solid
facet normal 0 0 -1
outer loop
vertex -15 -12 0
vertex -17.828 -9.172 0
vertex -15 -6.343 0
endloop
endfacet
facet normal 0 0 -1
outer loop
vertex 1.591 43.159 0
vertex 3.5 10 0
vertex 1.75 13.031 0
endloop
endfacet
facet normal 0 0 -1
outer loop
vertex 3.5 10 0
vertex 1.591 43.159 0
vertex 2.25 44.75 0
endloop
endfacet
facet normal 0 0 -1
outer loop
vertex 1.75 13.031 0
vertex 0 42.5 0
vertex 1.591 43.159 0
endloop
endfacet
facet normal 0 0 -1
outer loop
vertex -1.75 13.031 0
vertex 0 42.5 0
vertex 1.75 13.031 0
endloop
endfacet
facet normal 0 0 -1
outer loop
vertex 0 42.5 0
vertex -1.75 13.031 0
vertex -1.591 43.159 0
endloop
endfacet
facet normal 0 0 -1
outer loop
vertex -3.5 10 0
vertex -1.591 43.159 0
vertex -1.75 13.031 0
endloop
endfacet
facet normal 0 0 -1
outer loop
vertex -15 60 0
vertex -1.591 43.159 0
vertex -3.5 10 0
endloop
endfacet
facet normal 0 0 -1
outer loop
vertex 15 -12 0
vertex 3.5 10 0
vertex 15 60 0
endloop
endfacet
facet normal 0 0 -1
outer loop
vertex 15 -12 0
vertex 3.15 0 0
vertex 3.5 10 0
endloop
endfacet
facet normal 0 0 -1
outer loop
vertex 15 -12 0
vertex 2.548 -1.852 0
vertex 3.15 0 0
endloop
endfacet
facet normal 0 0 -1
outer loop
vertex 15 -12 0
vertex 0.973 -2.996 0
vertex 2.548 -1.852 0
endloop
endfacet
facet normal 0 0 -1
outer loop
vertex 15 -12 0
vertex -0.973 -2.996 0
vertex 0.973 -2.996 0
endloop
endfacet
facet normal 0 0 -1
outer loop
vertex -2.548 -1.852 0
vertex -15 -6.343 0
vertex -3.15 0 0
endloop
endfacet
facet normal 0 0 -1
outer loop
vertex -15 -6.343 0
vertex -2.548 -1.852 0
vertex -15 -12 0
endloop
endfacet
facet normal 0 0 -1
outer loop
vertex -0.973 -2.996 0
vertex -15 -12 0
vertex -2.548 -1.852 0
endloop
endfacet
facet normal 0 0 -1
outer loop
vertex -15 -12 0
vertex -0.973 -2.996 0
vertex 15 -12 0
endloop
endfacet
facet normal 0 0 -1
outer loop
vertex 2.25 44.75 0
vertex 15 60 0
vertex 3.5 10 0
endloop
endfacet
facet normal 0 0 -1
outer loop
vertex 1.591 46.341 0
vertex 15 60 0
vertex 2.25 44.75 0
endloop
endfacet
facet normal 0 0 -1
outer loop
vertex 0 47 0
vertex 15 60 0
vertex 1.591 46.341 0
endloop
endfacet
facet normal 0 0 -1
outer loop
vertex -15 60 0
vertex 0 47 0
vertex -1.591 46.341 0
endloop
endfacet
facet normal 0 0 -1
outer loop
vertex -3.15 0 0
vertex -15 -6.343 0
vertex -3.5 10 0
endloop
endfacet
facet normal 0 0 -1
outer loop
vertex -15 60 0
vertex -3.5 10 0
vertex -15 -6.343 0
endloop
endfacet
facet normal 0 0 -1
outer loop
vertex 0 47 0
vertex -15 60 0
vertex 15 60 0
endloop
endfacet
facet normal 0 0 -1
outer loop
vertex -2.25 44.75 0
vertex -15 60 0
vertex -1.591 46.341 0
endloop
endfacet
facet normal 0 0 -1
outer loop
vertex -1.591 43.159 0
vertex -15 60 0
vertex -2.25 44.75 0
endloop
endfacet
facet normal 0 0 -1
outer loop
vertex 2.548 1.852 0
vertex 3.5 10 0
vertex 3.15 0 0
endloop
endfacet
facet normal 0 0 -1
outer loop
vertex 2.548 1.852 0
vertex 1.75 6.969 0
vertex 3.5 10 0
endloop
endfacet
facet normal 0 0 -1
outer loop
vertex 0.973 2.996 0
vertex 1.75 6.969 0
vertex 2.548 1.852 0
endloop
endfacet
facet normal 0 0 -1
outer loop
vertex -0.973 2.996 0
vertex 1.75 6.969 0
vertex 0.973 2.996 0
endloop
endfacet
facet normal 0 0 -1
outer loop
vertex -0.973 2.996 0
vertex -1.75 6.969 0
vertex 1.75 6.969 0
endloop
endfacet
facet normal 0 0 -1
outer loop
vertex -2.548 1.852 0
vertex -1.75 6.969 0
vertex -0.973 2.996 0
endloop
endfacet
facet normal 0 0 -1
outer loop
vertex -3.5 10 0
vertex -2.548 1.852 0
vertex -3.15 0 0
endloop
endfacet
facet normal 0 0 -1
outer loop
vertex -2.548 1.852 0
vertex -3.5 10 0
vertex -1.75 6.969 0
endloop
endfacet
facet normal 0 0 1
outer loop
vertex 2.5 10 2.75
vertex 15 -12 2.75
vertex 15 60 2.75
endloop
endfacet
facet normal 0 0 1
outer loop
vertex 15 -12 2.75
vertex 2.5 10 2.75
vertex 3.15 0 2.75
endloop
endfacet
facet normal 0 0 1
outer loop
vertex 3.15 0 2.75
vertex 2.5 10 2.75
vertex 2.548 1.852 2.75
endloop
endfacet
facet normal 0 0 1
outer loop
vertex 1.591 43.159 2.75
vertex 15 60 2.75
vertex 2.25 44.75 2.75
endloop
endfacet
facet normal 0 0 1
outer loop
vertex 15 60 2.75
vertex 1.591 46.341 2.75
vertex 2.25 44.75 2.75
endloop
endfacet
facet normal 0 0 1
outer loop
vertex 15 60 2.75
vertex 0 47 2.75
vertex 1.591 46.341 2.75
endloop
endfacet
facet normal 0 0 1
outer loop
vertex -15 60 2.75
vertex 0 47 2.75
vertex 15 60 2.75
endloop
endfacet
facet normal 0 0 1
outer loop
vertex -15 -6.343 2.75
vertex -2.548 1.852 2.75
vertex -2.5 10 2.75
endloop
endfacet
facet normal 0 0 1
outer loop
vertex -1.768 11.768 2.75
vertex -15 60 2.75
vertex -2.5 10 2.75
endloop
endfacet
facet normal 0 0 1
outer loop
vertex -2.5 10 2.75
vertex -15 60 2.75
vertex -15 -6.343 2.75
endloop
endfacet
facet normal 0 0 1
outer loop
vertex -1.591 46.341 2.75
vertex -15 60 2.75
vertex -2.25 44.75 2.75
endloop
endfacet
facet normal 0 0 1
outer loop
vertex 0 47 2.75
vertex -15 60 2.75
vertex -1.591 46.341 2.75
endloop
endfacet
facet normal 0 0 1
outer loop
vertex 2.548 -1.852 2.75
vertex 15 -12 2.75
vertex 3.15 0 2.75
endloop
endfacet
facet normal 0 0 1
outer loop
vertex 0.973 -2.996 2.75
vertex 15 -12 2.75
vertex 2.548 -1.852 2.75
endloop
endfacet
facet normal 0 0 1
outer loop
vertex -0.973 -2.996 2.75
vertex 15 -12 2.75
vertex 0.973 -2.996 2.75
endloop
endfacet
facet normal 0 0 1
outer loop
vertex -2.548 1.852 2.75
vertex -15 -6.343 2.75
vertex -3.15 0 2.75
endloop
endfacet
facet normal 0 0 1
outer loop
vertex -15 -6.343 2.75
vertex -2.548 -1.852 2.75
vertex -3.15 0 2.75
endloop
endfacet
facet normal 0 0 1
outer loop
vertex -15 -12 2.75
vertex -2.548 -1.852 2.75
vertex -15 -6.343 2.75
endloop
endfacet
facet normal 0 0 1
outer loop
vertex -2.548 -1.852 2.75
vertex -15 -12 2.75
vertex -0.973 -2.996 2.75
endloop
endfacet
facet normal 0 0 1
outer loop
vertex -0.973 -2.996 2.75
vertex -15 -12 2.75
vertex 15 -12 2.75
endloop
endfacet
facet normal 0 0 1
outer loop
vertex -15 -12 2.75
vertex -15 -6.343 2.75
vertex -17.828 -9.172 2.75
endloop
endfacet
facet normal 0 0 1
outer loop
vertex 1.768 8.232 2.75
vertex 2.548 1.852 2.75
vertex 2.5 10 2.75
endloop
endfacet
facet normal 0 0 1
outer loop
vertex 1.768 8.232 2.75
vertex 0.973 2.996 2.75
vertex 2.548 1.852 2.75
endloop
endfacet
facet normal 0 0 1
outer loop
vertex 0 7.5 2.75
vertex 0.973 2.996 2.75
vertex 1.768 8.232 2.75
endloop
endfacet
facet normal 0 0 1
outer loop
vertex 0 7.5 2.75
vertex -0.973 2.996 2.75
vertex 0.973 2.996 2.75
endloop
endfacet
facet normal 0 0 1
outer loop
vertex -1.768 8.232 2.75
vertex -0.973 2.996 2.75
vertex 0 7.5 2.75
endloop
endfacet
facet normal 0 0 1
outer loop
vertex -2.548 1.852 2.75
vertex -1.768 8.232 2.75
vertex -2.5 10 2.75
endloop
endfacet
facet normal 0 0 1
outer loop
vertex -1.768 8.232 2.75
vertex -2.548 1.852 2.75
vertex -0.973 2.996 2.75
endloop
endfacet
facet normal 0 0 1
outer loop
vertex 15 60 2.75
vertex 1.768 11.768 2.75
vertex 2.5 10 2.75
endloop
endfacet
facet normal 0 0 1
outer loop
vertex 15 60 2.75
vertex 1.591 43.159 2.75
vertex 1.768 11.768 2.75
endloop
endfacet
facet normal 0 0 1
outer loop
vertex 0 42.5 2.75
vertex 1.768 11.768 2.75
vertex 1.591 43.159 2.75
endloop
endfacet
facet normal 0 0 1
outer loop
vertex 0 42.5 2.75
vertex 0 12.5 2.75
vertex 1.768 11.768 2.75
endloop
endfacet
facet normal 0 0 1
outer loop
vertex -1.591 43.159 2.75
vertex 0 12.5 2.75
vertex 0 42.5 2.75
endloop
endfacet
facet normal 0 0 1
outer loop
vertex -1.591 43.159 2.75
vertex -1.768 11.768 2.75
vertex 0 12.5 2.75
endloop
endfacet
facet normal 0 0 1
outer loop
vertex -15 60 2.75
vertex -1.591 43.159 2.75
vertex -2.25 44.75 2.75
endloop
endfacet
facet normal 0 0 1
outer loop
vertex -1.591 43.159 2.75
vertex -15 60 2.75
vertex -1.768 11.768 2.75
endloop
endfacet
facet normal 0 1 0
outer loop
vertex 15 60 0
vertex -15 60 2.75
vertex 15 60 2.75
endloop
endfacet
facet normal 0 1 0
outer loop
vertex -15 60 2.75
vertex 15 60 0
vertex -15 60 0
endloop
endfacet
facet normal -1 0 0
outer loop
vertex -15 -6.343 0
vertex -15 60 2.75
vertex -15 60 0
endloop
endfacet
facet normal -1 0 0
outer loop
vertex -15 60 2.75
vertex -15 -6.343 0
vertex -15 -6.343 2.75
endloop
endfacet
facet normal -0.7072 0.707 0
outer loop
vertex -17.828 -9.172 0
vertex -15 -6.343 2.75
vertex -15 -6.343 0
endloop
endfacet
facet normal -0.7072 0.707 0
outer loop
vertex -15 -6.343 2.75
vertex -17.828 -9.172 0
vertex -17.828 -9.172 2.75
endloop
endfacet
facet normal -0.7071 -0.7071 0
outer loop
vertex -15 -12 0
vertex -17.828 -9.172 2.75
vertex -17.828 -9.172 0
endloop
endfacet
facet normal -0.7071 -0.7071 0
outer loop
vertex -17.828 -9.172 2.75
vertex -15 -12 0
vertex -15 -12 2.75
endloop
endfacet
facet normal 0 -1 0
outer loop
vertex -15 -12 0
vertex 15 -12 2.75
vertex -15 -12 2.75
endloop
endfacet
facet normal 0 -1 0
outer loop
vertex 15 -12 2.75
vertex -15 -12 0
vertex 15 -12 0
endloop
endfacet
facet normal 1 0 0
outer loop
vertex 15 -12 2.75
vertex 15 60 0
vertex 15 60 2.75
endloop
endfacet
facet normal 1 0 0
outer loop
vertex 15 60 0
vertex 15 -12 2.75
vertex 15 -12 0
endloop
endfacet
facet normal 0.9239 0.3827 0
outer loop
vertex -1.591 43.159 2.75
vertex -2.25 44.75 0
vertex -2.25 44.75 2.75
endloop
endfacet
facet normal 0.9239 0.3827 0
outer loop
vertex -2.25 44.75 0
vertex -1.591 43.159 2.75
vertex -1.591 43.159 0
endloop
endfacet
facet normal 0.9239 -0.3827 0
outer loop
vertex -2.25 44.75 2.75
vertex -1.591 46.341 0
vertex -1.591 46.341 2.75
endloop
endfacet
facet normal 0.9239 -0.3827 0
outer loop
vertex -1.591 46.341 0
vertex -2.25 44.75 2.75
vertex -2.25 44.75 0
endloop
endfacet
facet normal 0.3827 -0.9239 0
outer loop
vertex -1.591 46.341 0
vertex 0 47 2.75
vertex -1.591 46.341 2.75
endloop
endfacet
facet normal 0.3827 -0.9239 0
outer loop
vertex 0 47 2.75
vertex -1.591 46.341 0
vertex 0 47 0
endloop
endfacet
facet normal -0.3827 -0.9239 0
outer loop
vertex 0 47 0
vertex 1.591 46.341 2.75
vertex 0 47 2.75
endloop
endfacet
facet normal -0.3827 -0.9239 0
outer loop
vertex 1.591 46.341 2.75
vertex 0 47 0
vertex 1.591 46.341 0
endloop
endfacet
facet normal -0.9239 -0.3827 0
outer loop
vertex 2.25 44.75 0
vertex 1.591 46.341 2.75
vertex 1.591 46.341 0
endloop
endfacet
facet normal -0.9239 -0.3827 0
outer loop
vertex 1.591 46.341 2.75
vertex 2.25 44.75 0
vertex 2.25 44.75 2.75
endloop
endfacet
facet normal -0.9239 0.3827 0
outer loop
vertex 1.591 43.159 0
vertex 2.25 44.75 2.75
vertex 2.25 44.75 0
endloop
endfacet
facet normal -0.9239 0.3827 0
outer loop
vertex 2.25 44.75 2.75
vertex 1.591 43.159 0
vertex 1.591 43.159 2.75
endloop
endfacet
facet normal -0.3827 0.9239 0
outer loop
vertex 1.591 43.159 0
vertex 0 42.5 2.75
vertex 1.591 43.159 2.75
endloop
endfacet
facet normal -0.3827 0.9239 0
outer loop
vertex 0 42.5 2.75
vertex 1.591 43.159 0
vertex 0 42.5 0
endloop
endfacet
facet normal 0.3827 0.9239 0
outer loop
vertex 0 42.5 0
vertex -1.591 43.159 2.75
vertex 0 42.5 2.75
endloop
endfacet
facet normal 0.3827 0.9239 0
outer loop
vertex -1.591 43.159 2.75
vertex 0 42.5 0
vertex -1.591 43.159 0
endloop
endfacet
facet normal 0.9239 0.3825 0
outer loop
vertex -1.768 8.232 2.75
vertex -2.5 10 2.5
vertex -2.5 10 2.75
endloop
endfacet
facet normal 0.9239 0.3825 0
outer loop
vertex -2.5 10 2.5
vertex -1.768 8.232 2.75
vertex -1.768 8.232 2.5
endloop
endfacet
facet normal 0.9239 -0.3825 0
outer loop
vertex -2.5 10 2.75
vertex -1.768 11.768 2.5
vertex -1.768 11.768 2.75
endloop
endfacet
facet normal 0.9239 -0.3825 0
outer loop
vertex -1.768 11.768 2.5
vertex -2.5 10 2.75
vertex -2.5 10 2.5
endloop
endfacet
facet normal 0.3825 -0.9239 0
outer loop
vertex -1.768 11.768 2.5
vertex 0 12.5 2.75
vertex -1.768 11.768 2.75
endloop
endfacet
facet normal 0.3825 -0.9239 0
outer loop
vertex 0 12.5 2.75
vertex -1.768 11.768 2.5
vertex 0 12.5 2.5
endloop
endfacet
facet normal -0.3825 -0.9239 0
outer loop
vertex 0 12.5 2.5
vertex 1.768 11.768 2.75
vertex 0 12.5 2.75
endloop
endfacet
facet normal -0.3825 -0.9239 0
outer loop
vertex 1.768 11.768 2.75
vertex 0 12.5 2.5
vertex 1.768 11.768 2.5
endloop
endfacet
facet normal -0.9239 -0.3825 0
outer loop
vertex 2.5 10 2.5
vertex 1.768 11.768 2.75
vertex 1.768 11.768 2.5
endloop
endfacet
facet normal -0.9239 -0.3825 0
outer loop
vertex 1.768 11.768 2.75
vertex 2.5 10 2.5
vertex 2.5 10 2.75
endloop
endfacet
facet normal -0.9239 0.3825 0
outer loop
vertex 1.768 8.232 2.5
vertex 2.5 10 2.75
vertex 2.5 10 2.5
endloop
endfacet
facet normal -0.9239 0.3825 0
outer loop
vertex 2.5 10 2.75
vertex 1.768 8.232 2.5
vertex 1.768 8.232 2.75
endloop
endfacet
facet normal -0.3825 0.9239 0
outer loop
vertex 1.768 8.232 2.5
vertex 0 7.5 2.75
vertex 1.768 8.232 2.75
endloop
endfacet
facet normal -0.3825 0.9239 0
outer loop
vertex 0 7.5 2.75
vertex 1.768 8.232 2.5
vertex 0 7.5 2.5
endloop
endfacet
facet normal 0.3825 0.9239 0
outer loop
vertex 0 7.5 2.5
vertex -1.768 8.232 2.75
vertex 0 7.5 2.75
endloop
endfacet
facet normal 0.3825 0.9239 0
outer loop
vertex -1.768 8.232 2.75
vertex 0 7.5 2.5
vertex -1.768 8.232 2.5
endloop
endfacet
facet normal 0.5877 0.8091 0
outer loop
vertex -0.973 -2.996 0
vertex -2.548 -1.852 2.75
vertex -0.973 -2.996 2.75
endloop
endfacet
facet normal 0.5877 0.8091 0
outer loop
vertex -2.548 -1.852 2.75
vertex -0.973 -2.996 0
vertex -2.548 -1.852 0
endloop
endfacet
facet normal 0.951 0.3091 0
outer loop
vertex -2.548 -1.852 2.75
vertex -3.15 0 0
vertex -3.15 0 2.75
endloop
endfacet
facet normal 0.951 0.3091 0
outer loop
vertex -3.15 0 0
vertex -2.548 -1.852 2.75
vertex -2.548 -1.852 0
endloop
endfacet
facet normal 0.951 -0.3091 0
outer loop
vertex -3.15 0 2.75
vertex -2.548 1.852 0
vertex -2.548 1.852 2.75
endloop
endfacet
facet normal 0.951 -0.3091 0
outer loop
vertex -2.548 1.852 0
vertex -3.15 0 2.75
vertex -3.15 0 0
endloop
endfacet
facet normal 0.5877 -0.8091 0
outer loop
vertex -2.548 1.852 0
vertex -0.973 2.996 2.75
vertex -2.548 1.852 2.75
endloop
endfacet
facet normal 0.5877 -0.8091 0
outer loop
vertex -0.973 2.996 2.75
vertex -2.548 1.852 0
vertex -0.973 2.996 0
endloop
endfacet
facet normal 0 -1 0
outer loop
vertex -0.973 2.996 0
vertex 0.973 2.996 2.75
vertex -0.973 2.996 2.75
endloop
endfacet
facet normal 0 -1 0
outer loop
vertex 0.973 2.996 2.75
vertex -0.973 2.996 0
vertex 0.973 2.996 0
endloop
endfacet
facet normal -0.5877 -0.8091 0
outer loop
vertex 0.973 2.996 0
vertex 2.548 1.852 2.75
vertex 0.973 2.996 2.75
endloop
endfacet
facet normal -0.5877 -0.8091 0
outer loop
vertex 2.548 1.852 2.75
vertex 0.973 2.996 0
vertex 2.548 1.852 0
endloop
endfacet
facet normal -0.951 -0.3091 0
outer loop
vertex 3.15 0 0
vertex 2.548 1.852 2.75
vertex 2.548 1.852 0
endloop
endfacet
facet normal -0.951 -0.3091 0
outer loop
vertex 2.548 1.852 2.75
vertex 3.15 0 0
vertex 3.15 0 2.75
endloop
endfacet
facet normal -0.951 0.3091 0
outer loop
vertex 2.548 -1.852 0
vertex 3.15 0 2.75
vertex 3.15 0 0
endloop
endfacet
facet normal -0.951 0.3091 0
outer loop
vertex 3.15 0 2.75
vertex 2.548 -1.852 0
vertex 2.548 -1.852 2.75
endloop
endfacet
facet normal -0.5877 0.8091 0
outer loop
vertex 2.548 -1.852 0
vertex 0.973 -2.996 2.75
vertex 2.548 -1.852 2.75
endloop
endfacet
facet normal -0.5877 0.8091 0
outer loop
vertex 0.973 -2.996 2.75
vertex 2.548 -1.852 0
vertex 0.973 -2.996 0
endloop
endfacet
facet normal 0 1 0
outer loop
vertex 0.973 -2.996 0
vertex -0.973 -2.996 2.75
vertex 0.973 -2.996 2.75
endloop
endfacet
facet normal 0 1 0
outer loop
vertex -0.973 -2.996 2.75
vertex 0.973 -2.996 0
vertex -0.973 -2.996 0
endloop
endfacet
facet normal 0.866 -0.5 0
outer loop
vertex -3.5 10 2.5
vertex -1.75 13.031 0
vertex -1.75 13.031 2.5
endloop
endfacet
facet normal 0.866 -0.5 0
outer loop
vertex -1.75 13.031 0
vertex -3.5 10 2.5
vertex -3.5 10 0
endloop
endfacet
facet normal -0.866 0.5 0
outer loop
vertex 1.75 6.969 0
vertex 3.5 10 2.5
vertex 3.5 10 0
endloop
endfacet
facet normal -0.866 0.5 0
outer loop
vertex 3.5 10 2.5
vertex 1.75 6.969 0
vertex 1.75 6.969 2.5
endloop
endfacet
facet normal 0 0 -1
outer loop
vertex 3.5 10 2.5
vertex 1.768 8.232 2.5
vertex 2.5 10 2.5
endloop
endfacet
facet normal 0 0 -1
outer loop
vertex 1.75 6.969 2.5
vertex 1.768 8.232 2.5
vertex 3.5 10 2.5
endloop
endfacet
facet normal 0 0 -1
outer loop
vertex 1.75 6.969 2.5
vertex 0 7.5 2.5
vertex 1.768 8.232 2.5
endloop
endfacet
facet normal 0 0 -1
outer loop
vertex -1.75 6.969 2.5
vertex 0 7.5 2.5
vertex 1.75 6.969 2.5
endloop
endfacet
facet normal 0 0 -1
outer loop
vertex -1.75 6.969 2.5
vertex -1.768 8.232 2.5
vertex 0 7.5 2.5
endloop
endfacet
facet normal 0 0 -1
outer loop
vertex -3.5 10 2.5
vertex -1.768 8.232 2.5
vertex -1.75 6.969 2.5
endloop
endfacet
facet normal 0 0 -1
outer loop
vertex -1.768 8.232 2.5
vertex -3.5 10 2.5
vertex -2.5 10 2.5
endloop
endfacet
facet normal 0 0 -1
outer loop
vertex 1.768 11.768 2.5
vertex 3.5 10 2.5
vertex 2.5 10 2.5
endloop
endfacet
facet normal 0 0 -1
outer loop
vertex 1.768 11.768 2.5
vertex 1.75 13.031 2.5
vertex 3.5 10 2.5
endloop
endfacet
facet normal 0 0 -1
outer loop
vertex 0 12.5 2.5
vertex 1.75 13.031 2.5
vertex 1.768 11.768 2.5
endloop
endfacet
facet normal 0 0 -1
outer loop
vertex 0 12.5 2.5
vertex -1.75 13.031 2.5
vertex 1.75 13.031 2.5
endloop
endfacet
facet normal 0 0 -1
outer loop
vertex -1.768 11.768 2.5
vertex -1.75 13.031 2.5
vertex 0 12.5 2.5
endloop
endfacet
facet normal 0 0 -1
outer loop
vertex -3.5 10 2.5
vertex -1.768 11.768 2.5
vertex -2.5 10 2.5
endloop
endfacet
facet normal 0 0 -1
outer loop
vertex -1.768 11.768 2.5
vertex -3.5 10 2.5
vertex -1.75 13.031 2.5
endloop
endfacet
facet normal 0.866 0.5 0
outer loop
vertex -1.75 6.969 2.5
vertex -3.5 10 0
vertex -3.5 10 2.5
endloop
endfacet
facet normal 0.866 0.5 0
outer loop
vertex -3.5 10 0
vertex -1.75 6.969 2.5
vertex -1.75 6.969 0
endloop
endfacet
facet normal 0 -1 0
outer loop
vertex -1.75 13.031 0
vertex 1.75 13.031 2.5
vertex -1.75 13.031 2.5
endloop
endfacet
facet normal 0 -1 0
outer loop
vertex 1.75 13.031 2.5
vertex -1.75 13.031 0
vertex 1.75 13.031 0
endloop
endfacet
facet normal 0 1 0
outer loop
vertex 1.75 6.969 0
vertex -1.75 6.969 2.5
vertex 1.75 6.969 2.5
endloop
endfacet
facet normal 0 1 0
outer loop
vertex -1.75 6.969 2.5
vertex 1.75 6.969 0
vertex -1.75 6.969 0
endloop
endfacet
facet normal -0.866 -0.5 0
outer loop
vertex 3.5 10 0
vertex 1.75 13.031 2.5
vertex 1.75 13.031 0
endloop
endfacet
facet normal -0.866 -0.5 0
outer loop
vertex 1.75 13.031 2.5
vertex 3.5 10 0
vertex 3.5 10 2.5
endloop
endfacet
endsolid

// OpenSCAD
// file: rear_standard_tilt_plate.scad
include <../../constants.scad>
use <./rear_standard_tilt_slot.scad>

module rear_standard_tilt_plate(print = false) {
    union() {
        linear_extrude(height = rear_standard_tilt_plate_thickness) 
        difference() {
            // base shape
            union() {
                slot_outline_thickness = 3;
                plate_height = rear_standard_housing_height / 1.75;
                plate_offset_y = plate_height / 3;
                translate(v = [0,plate_offset_y,0]) {
                    square(size = [rear_standard_housing_depth,plate_height], center = true);
                }
                rotate(a = 90, v = [0,0,1]) {
                    rear_standard_tilt_slot(additional_slot_width = slot_outline_thickness * 2);
                }
            }
            // slot cutout
            rotate(a = 90, v = [0,0,1]) {
                rear_standard_tilt_slot();
            }

            if (!print) {
                // hole for pivot stud
                circle(r = (rear_standard_tilt_pivot_diameter / 2) + .25);
            }
        }

        // 3d printed pivot
        if (print) {
            translate(v = [0,0,rear_standard_tilt_plate_thickness]) linear_extrude(height = rear_standard_rise_plate_thickness + rear_standard_carrier_thickness - 1) circle(r = rear_standard_tilt_pivot_diameter / 2 - .25);
        }
    }
}

rear_standard_tilt_plate(true);
// file: rear_standard_tilt_slot.scad
include <../../constants.scad>

module rear_standard_tilt_slot(additional_slot_width = 0) {
    working_slot_width = rear_standard_tilt_slot_width + additional_slot_width;  
    theta = (rear_standard_tilt_slot_range) / 2;
    H = rear_standard_tilt_slot_radius + (working_slot_width / 2);
    triangle_half_width = H * tan(theta);

    rotate(a =  rear_standard_tilt_slot_rotational_offset, v = [0,0,1]) 
    intersection() {
        polygon(points = [
            [0,0],
            [H,triangle_half_width],
            [H,-triangle_half_width]
            ]);
        //slot ring
        difference() {
            circle(r = rear_standard_tilt_slot_radius + working_slot_width / 2);
            circle(r = rear_standard_tilt_slot_radius - working_slot_width / 2);
        }
    }
    rotate(a = rear_standard_tilt_slot_range / 2 + rear_standard_tilt_slot_rotational_offset, v = [0,0,1]) {
        translate(v = [H - working_slot_width / 2,0,0]) {
            circle(r = working_slot_width / 2);
        }
    }
    rotate(a = -rear_standard_tilt_slot_range / 2 + rear_standard_tilt_slot_rotational_offset, v = [0,0,1]) {
        translate(v = [H - working_slot_width / 2,0,0]) {
            circle(r = working_slot_width / 2);
        }
    }
}

rear_standard_tilt_slot();
// file: ../../constants.scad
/********************
* Table of Contents *
* *******************/
// 1. Materials
// 2. Rear Standard
    // 2.1 Rear Standard Housing
    // 2.2 Rear Standard Tilt Plate
    // 2.3 Rear Standard Rise Plate
    // 2.4 Rear Standard Carrier
// 3. Front Standard
// 4. Base
// 5. Ground Glass
// 6. Film Cassette
// 7. Movements



/****************
* 1. Materials  *
* **************/
    sheet_metal_thickness_structural = 3;
    sheet_metal_thickness_nonstructural = 2.75; // 2.75 for 3d print, 2 otherwise
    screw_hole_metric_3 = 3;
    screw_hole_metric_4 = 4;
    screw_hole_metric_5 = 5;
    screw_hole_metric_6 = 6;

/********************
* 2. Rear Standard  *
* *******************/

    // 2.1 Rear Standard Housing
    rear_standard_housing_width = 245;
    rear_standard_housing_height = 126;
    rear_standard_housing_depth = 30;
    rear_standard_housing_thickness = 10;
    rear_standard_housing_frame_width = 33;
    rear_standard_housing_tilt_slot_additional_width = 2; // screw head diameter + small margin - rear_standard_tilt_slot_width
    


    // 2.2 Rear Standard Tilt Plate
    rear_standard_tilt_plate_thickness = sheet_metal_thickness_nonstructural;
    rear_standard_tilt_slot_radius = 45;
    rear_standard_tilt_slot_width = 5;
    rear_standard_tilt_slot_range = 50;
    rear_standard_tilt_slot_rotational_offset = 5;
    rear_standard_tilt_lock_screw_diameter = 4;
    rear_standard_tilt_pivot_diameter = 6;



    // 2.3 Rear Standard Rise Plate
    rear_standard_rise_stud_diameter = screw_hole_metric_5;
    rear_standard_rise_plate_thickness = sheet_metal_thickness_nonstructural;


    // 2.4 Rear Standard Carrier
    rear_standard_carrier_thickness = sheet_metal_thickness_structural;
    rear_standard_carrier_width = 30;
    rear_standard_carrier_base_length = rear_standard_housing_width + ((rear_standard_tilt_plate_thickness + rear_standard_rise_plate_thickness) * 2) + (rear_standard_carrier_thickness * 2) + .25;
    rear_standard_carrier_base_ear_length = 40;
    rear_standard_carrier_base_slot_length = 160;
    rear_standard_carrier_base_slot_width = 6;
    rear_standard_carrier_upright_length = 149;
    rear_standard_carrier_upright_slot_width = 6;
    rear_standard_carrier_screw_hole_diameter = screw_hole_metric_4;
    rear_standard_carrier_screw_hole_triangle_side_length = (rear_standard_carrier_width / 3) + rear_standard_carrier_screw_hole_diameter;
    rear_standard_carrier_screw_hole_triangle_height = (rear_standard_carrier_screw_hole_triangle_side_length * sqrt(3)) / 2;
    rear_standard_carrier_screw_hole_triangle_top_margin = 5;


/****************
* 7. Movements  *
* **************/
    zero_marker_side_length = 4;
    rear_standard_rise_zero_pos = rear_standard_carrier_upright_length + rear_standard_carrier_base_ear_length / 2 - rear_standard_housing_height;
    rear_standard_rise = 0;
// main file
include <../../constants.scad>
use <./rear_standard_tilt_slot.scad>
use <./rear_standard_tilt_plate.scad>

module rear_standard_rise_plate(print = true) {
    union() {
        difference() {
            linear_extrude(height = rear_standard_rise_plate_thickness) difference() {
                // base shape
                union() {
                    slot_outline_thickness = 3;
                    plate_height = rear_standard_housing_height / 1.75;
                    plate_offset_y = plate_height / 3;
                    translate(v = [0,plate_offset_y,0]) {
                        square(size = [rear_standard_housing_depth,plate_height], center = true);
                    }


                    // zero marker
                    zero_marker_offset_x = -rear_standard_housing_depth / 2;
                    zero_marker_offset_y = -(plate_height / 2) + plate_offset_y + (sqrt(2 * zero_marker_side_length));
                    translate(v = [zero_marker_offset_x,zero_marker_offset_y,0]) {    
                        rotate(a = 45, v = [0,0,1]) {
                            square(size = [zero_marker_side_length,zero_marker_side_length], center = true);
                        }
                    }
                }
                
                // hole for pivot stud
                circle(r = rear_standard_tilt_pivot_diameter / 2 + .15);

                // hole for rise screw stud
                    translate(v = [0,rear_standard_rise_stud_diameter * 2, 0]) circle(r = rear_standard_rise_stud_diameter / 2);

                // hole for tilt lock screw
                translate(v = [0,rear_standard_tilt_slot_radius - .25,0]) {
                    circle(r = (rear_standard_tilt_lock_screw_diameter / 2) + 0.25);
                } 
            }
            if (print) {
                bolt_head_depth = 2.5;
                translate(v = [0,rear_standard_rise_stud_diameter * 2,0]) linear_extrude(height=bolt_head_depth)circle(r = 3.5, $fn=6); 
            }
        }
    }
    
}

rear_standard_rise_plate(print=true);
